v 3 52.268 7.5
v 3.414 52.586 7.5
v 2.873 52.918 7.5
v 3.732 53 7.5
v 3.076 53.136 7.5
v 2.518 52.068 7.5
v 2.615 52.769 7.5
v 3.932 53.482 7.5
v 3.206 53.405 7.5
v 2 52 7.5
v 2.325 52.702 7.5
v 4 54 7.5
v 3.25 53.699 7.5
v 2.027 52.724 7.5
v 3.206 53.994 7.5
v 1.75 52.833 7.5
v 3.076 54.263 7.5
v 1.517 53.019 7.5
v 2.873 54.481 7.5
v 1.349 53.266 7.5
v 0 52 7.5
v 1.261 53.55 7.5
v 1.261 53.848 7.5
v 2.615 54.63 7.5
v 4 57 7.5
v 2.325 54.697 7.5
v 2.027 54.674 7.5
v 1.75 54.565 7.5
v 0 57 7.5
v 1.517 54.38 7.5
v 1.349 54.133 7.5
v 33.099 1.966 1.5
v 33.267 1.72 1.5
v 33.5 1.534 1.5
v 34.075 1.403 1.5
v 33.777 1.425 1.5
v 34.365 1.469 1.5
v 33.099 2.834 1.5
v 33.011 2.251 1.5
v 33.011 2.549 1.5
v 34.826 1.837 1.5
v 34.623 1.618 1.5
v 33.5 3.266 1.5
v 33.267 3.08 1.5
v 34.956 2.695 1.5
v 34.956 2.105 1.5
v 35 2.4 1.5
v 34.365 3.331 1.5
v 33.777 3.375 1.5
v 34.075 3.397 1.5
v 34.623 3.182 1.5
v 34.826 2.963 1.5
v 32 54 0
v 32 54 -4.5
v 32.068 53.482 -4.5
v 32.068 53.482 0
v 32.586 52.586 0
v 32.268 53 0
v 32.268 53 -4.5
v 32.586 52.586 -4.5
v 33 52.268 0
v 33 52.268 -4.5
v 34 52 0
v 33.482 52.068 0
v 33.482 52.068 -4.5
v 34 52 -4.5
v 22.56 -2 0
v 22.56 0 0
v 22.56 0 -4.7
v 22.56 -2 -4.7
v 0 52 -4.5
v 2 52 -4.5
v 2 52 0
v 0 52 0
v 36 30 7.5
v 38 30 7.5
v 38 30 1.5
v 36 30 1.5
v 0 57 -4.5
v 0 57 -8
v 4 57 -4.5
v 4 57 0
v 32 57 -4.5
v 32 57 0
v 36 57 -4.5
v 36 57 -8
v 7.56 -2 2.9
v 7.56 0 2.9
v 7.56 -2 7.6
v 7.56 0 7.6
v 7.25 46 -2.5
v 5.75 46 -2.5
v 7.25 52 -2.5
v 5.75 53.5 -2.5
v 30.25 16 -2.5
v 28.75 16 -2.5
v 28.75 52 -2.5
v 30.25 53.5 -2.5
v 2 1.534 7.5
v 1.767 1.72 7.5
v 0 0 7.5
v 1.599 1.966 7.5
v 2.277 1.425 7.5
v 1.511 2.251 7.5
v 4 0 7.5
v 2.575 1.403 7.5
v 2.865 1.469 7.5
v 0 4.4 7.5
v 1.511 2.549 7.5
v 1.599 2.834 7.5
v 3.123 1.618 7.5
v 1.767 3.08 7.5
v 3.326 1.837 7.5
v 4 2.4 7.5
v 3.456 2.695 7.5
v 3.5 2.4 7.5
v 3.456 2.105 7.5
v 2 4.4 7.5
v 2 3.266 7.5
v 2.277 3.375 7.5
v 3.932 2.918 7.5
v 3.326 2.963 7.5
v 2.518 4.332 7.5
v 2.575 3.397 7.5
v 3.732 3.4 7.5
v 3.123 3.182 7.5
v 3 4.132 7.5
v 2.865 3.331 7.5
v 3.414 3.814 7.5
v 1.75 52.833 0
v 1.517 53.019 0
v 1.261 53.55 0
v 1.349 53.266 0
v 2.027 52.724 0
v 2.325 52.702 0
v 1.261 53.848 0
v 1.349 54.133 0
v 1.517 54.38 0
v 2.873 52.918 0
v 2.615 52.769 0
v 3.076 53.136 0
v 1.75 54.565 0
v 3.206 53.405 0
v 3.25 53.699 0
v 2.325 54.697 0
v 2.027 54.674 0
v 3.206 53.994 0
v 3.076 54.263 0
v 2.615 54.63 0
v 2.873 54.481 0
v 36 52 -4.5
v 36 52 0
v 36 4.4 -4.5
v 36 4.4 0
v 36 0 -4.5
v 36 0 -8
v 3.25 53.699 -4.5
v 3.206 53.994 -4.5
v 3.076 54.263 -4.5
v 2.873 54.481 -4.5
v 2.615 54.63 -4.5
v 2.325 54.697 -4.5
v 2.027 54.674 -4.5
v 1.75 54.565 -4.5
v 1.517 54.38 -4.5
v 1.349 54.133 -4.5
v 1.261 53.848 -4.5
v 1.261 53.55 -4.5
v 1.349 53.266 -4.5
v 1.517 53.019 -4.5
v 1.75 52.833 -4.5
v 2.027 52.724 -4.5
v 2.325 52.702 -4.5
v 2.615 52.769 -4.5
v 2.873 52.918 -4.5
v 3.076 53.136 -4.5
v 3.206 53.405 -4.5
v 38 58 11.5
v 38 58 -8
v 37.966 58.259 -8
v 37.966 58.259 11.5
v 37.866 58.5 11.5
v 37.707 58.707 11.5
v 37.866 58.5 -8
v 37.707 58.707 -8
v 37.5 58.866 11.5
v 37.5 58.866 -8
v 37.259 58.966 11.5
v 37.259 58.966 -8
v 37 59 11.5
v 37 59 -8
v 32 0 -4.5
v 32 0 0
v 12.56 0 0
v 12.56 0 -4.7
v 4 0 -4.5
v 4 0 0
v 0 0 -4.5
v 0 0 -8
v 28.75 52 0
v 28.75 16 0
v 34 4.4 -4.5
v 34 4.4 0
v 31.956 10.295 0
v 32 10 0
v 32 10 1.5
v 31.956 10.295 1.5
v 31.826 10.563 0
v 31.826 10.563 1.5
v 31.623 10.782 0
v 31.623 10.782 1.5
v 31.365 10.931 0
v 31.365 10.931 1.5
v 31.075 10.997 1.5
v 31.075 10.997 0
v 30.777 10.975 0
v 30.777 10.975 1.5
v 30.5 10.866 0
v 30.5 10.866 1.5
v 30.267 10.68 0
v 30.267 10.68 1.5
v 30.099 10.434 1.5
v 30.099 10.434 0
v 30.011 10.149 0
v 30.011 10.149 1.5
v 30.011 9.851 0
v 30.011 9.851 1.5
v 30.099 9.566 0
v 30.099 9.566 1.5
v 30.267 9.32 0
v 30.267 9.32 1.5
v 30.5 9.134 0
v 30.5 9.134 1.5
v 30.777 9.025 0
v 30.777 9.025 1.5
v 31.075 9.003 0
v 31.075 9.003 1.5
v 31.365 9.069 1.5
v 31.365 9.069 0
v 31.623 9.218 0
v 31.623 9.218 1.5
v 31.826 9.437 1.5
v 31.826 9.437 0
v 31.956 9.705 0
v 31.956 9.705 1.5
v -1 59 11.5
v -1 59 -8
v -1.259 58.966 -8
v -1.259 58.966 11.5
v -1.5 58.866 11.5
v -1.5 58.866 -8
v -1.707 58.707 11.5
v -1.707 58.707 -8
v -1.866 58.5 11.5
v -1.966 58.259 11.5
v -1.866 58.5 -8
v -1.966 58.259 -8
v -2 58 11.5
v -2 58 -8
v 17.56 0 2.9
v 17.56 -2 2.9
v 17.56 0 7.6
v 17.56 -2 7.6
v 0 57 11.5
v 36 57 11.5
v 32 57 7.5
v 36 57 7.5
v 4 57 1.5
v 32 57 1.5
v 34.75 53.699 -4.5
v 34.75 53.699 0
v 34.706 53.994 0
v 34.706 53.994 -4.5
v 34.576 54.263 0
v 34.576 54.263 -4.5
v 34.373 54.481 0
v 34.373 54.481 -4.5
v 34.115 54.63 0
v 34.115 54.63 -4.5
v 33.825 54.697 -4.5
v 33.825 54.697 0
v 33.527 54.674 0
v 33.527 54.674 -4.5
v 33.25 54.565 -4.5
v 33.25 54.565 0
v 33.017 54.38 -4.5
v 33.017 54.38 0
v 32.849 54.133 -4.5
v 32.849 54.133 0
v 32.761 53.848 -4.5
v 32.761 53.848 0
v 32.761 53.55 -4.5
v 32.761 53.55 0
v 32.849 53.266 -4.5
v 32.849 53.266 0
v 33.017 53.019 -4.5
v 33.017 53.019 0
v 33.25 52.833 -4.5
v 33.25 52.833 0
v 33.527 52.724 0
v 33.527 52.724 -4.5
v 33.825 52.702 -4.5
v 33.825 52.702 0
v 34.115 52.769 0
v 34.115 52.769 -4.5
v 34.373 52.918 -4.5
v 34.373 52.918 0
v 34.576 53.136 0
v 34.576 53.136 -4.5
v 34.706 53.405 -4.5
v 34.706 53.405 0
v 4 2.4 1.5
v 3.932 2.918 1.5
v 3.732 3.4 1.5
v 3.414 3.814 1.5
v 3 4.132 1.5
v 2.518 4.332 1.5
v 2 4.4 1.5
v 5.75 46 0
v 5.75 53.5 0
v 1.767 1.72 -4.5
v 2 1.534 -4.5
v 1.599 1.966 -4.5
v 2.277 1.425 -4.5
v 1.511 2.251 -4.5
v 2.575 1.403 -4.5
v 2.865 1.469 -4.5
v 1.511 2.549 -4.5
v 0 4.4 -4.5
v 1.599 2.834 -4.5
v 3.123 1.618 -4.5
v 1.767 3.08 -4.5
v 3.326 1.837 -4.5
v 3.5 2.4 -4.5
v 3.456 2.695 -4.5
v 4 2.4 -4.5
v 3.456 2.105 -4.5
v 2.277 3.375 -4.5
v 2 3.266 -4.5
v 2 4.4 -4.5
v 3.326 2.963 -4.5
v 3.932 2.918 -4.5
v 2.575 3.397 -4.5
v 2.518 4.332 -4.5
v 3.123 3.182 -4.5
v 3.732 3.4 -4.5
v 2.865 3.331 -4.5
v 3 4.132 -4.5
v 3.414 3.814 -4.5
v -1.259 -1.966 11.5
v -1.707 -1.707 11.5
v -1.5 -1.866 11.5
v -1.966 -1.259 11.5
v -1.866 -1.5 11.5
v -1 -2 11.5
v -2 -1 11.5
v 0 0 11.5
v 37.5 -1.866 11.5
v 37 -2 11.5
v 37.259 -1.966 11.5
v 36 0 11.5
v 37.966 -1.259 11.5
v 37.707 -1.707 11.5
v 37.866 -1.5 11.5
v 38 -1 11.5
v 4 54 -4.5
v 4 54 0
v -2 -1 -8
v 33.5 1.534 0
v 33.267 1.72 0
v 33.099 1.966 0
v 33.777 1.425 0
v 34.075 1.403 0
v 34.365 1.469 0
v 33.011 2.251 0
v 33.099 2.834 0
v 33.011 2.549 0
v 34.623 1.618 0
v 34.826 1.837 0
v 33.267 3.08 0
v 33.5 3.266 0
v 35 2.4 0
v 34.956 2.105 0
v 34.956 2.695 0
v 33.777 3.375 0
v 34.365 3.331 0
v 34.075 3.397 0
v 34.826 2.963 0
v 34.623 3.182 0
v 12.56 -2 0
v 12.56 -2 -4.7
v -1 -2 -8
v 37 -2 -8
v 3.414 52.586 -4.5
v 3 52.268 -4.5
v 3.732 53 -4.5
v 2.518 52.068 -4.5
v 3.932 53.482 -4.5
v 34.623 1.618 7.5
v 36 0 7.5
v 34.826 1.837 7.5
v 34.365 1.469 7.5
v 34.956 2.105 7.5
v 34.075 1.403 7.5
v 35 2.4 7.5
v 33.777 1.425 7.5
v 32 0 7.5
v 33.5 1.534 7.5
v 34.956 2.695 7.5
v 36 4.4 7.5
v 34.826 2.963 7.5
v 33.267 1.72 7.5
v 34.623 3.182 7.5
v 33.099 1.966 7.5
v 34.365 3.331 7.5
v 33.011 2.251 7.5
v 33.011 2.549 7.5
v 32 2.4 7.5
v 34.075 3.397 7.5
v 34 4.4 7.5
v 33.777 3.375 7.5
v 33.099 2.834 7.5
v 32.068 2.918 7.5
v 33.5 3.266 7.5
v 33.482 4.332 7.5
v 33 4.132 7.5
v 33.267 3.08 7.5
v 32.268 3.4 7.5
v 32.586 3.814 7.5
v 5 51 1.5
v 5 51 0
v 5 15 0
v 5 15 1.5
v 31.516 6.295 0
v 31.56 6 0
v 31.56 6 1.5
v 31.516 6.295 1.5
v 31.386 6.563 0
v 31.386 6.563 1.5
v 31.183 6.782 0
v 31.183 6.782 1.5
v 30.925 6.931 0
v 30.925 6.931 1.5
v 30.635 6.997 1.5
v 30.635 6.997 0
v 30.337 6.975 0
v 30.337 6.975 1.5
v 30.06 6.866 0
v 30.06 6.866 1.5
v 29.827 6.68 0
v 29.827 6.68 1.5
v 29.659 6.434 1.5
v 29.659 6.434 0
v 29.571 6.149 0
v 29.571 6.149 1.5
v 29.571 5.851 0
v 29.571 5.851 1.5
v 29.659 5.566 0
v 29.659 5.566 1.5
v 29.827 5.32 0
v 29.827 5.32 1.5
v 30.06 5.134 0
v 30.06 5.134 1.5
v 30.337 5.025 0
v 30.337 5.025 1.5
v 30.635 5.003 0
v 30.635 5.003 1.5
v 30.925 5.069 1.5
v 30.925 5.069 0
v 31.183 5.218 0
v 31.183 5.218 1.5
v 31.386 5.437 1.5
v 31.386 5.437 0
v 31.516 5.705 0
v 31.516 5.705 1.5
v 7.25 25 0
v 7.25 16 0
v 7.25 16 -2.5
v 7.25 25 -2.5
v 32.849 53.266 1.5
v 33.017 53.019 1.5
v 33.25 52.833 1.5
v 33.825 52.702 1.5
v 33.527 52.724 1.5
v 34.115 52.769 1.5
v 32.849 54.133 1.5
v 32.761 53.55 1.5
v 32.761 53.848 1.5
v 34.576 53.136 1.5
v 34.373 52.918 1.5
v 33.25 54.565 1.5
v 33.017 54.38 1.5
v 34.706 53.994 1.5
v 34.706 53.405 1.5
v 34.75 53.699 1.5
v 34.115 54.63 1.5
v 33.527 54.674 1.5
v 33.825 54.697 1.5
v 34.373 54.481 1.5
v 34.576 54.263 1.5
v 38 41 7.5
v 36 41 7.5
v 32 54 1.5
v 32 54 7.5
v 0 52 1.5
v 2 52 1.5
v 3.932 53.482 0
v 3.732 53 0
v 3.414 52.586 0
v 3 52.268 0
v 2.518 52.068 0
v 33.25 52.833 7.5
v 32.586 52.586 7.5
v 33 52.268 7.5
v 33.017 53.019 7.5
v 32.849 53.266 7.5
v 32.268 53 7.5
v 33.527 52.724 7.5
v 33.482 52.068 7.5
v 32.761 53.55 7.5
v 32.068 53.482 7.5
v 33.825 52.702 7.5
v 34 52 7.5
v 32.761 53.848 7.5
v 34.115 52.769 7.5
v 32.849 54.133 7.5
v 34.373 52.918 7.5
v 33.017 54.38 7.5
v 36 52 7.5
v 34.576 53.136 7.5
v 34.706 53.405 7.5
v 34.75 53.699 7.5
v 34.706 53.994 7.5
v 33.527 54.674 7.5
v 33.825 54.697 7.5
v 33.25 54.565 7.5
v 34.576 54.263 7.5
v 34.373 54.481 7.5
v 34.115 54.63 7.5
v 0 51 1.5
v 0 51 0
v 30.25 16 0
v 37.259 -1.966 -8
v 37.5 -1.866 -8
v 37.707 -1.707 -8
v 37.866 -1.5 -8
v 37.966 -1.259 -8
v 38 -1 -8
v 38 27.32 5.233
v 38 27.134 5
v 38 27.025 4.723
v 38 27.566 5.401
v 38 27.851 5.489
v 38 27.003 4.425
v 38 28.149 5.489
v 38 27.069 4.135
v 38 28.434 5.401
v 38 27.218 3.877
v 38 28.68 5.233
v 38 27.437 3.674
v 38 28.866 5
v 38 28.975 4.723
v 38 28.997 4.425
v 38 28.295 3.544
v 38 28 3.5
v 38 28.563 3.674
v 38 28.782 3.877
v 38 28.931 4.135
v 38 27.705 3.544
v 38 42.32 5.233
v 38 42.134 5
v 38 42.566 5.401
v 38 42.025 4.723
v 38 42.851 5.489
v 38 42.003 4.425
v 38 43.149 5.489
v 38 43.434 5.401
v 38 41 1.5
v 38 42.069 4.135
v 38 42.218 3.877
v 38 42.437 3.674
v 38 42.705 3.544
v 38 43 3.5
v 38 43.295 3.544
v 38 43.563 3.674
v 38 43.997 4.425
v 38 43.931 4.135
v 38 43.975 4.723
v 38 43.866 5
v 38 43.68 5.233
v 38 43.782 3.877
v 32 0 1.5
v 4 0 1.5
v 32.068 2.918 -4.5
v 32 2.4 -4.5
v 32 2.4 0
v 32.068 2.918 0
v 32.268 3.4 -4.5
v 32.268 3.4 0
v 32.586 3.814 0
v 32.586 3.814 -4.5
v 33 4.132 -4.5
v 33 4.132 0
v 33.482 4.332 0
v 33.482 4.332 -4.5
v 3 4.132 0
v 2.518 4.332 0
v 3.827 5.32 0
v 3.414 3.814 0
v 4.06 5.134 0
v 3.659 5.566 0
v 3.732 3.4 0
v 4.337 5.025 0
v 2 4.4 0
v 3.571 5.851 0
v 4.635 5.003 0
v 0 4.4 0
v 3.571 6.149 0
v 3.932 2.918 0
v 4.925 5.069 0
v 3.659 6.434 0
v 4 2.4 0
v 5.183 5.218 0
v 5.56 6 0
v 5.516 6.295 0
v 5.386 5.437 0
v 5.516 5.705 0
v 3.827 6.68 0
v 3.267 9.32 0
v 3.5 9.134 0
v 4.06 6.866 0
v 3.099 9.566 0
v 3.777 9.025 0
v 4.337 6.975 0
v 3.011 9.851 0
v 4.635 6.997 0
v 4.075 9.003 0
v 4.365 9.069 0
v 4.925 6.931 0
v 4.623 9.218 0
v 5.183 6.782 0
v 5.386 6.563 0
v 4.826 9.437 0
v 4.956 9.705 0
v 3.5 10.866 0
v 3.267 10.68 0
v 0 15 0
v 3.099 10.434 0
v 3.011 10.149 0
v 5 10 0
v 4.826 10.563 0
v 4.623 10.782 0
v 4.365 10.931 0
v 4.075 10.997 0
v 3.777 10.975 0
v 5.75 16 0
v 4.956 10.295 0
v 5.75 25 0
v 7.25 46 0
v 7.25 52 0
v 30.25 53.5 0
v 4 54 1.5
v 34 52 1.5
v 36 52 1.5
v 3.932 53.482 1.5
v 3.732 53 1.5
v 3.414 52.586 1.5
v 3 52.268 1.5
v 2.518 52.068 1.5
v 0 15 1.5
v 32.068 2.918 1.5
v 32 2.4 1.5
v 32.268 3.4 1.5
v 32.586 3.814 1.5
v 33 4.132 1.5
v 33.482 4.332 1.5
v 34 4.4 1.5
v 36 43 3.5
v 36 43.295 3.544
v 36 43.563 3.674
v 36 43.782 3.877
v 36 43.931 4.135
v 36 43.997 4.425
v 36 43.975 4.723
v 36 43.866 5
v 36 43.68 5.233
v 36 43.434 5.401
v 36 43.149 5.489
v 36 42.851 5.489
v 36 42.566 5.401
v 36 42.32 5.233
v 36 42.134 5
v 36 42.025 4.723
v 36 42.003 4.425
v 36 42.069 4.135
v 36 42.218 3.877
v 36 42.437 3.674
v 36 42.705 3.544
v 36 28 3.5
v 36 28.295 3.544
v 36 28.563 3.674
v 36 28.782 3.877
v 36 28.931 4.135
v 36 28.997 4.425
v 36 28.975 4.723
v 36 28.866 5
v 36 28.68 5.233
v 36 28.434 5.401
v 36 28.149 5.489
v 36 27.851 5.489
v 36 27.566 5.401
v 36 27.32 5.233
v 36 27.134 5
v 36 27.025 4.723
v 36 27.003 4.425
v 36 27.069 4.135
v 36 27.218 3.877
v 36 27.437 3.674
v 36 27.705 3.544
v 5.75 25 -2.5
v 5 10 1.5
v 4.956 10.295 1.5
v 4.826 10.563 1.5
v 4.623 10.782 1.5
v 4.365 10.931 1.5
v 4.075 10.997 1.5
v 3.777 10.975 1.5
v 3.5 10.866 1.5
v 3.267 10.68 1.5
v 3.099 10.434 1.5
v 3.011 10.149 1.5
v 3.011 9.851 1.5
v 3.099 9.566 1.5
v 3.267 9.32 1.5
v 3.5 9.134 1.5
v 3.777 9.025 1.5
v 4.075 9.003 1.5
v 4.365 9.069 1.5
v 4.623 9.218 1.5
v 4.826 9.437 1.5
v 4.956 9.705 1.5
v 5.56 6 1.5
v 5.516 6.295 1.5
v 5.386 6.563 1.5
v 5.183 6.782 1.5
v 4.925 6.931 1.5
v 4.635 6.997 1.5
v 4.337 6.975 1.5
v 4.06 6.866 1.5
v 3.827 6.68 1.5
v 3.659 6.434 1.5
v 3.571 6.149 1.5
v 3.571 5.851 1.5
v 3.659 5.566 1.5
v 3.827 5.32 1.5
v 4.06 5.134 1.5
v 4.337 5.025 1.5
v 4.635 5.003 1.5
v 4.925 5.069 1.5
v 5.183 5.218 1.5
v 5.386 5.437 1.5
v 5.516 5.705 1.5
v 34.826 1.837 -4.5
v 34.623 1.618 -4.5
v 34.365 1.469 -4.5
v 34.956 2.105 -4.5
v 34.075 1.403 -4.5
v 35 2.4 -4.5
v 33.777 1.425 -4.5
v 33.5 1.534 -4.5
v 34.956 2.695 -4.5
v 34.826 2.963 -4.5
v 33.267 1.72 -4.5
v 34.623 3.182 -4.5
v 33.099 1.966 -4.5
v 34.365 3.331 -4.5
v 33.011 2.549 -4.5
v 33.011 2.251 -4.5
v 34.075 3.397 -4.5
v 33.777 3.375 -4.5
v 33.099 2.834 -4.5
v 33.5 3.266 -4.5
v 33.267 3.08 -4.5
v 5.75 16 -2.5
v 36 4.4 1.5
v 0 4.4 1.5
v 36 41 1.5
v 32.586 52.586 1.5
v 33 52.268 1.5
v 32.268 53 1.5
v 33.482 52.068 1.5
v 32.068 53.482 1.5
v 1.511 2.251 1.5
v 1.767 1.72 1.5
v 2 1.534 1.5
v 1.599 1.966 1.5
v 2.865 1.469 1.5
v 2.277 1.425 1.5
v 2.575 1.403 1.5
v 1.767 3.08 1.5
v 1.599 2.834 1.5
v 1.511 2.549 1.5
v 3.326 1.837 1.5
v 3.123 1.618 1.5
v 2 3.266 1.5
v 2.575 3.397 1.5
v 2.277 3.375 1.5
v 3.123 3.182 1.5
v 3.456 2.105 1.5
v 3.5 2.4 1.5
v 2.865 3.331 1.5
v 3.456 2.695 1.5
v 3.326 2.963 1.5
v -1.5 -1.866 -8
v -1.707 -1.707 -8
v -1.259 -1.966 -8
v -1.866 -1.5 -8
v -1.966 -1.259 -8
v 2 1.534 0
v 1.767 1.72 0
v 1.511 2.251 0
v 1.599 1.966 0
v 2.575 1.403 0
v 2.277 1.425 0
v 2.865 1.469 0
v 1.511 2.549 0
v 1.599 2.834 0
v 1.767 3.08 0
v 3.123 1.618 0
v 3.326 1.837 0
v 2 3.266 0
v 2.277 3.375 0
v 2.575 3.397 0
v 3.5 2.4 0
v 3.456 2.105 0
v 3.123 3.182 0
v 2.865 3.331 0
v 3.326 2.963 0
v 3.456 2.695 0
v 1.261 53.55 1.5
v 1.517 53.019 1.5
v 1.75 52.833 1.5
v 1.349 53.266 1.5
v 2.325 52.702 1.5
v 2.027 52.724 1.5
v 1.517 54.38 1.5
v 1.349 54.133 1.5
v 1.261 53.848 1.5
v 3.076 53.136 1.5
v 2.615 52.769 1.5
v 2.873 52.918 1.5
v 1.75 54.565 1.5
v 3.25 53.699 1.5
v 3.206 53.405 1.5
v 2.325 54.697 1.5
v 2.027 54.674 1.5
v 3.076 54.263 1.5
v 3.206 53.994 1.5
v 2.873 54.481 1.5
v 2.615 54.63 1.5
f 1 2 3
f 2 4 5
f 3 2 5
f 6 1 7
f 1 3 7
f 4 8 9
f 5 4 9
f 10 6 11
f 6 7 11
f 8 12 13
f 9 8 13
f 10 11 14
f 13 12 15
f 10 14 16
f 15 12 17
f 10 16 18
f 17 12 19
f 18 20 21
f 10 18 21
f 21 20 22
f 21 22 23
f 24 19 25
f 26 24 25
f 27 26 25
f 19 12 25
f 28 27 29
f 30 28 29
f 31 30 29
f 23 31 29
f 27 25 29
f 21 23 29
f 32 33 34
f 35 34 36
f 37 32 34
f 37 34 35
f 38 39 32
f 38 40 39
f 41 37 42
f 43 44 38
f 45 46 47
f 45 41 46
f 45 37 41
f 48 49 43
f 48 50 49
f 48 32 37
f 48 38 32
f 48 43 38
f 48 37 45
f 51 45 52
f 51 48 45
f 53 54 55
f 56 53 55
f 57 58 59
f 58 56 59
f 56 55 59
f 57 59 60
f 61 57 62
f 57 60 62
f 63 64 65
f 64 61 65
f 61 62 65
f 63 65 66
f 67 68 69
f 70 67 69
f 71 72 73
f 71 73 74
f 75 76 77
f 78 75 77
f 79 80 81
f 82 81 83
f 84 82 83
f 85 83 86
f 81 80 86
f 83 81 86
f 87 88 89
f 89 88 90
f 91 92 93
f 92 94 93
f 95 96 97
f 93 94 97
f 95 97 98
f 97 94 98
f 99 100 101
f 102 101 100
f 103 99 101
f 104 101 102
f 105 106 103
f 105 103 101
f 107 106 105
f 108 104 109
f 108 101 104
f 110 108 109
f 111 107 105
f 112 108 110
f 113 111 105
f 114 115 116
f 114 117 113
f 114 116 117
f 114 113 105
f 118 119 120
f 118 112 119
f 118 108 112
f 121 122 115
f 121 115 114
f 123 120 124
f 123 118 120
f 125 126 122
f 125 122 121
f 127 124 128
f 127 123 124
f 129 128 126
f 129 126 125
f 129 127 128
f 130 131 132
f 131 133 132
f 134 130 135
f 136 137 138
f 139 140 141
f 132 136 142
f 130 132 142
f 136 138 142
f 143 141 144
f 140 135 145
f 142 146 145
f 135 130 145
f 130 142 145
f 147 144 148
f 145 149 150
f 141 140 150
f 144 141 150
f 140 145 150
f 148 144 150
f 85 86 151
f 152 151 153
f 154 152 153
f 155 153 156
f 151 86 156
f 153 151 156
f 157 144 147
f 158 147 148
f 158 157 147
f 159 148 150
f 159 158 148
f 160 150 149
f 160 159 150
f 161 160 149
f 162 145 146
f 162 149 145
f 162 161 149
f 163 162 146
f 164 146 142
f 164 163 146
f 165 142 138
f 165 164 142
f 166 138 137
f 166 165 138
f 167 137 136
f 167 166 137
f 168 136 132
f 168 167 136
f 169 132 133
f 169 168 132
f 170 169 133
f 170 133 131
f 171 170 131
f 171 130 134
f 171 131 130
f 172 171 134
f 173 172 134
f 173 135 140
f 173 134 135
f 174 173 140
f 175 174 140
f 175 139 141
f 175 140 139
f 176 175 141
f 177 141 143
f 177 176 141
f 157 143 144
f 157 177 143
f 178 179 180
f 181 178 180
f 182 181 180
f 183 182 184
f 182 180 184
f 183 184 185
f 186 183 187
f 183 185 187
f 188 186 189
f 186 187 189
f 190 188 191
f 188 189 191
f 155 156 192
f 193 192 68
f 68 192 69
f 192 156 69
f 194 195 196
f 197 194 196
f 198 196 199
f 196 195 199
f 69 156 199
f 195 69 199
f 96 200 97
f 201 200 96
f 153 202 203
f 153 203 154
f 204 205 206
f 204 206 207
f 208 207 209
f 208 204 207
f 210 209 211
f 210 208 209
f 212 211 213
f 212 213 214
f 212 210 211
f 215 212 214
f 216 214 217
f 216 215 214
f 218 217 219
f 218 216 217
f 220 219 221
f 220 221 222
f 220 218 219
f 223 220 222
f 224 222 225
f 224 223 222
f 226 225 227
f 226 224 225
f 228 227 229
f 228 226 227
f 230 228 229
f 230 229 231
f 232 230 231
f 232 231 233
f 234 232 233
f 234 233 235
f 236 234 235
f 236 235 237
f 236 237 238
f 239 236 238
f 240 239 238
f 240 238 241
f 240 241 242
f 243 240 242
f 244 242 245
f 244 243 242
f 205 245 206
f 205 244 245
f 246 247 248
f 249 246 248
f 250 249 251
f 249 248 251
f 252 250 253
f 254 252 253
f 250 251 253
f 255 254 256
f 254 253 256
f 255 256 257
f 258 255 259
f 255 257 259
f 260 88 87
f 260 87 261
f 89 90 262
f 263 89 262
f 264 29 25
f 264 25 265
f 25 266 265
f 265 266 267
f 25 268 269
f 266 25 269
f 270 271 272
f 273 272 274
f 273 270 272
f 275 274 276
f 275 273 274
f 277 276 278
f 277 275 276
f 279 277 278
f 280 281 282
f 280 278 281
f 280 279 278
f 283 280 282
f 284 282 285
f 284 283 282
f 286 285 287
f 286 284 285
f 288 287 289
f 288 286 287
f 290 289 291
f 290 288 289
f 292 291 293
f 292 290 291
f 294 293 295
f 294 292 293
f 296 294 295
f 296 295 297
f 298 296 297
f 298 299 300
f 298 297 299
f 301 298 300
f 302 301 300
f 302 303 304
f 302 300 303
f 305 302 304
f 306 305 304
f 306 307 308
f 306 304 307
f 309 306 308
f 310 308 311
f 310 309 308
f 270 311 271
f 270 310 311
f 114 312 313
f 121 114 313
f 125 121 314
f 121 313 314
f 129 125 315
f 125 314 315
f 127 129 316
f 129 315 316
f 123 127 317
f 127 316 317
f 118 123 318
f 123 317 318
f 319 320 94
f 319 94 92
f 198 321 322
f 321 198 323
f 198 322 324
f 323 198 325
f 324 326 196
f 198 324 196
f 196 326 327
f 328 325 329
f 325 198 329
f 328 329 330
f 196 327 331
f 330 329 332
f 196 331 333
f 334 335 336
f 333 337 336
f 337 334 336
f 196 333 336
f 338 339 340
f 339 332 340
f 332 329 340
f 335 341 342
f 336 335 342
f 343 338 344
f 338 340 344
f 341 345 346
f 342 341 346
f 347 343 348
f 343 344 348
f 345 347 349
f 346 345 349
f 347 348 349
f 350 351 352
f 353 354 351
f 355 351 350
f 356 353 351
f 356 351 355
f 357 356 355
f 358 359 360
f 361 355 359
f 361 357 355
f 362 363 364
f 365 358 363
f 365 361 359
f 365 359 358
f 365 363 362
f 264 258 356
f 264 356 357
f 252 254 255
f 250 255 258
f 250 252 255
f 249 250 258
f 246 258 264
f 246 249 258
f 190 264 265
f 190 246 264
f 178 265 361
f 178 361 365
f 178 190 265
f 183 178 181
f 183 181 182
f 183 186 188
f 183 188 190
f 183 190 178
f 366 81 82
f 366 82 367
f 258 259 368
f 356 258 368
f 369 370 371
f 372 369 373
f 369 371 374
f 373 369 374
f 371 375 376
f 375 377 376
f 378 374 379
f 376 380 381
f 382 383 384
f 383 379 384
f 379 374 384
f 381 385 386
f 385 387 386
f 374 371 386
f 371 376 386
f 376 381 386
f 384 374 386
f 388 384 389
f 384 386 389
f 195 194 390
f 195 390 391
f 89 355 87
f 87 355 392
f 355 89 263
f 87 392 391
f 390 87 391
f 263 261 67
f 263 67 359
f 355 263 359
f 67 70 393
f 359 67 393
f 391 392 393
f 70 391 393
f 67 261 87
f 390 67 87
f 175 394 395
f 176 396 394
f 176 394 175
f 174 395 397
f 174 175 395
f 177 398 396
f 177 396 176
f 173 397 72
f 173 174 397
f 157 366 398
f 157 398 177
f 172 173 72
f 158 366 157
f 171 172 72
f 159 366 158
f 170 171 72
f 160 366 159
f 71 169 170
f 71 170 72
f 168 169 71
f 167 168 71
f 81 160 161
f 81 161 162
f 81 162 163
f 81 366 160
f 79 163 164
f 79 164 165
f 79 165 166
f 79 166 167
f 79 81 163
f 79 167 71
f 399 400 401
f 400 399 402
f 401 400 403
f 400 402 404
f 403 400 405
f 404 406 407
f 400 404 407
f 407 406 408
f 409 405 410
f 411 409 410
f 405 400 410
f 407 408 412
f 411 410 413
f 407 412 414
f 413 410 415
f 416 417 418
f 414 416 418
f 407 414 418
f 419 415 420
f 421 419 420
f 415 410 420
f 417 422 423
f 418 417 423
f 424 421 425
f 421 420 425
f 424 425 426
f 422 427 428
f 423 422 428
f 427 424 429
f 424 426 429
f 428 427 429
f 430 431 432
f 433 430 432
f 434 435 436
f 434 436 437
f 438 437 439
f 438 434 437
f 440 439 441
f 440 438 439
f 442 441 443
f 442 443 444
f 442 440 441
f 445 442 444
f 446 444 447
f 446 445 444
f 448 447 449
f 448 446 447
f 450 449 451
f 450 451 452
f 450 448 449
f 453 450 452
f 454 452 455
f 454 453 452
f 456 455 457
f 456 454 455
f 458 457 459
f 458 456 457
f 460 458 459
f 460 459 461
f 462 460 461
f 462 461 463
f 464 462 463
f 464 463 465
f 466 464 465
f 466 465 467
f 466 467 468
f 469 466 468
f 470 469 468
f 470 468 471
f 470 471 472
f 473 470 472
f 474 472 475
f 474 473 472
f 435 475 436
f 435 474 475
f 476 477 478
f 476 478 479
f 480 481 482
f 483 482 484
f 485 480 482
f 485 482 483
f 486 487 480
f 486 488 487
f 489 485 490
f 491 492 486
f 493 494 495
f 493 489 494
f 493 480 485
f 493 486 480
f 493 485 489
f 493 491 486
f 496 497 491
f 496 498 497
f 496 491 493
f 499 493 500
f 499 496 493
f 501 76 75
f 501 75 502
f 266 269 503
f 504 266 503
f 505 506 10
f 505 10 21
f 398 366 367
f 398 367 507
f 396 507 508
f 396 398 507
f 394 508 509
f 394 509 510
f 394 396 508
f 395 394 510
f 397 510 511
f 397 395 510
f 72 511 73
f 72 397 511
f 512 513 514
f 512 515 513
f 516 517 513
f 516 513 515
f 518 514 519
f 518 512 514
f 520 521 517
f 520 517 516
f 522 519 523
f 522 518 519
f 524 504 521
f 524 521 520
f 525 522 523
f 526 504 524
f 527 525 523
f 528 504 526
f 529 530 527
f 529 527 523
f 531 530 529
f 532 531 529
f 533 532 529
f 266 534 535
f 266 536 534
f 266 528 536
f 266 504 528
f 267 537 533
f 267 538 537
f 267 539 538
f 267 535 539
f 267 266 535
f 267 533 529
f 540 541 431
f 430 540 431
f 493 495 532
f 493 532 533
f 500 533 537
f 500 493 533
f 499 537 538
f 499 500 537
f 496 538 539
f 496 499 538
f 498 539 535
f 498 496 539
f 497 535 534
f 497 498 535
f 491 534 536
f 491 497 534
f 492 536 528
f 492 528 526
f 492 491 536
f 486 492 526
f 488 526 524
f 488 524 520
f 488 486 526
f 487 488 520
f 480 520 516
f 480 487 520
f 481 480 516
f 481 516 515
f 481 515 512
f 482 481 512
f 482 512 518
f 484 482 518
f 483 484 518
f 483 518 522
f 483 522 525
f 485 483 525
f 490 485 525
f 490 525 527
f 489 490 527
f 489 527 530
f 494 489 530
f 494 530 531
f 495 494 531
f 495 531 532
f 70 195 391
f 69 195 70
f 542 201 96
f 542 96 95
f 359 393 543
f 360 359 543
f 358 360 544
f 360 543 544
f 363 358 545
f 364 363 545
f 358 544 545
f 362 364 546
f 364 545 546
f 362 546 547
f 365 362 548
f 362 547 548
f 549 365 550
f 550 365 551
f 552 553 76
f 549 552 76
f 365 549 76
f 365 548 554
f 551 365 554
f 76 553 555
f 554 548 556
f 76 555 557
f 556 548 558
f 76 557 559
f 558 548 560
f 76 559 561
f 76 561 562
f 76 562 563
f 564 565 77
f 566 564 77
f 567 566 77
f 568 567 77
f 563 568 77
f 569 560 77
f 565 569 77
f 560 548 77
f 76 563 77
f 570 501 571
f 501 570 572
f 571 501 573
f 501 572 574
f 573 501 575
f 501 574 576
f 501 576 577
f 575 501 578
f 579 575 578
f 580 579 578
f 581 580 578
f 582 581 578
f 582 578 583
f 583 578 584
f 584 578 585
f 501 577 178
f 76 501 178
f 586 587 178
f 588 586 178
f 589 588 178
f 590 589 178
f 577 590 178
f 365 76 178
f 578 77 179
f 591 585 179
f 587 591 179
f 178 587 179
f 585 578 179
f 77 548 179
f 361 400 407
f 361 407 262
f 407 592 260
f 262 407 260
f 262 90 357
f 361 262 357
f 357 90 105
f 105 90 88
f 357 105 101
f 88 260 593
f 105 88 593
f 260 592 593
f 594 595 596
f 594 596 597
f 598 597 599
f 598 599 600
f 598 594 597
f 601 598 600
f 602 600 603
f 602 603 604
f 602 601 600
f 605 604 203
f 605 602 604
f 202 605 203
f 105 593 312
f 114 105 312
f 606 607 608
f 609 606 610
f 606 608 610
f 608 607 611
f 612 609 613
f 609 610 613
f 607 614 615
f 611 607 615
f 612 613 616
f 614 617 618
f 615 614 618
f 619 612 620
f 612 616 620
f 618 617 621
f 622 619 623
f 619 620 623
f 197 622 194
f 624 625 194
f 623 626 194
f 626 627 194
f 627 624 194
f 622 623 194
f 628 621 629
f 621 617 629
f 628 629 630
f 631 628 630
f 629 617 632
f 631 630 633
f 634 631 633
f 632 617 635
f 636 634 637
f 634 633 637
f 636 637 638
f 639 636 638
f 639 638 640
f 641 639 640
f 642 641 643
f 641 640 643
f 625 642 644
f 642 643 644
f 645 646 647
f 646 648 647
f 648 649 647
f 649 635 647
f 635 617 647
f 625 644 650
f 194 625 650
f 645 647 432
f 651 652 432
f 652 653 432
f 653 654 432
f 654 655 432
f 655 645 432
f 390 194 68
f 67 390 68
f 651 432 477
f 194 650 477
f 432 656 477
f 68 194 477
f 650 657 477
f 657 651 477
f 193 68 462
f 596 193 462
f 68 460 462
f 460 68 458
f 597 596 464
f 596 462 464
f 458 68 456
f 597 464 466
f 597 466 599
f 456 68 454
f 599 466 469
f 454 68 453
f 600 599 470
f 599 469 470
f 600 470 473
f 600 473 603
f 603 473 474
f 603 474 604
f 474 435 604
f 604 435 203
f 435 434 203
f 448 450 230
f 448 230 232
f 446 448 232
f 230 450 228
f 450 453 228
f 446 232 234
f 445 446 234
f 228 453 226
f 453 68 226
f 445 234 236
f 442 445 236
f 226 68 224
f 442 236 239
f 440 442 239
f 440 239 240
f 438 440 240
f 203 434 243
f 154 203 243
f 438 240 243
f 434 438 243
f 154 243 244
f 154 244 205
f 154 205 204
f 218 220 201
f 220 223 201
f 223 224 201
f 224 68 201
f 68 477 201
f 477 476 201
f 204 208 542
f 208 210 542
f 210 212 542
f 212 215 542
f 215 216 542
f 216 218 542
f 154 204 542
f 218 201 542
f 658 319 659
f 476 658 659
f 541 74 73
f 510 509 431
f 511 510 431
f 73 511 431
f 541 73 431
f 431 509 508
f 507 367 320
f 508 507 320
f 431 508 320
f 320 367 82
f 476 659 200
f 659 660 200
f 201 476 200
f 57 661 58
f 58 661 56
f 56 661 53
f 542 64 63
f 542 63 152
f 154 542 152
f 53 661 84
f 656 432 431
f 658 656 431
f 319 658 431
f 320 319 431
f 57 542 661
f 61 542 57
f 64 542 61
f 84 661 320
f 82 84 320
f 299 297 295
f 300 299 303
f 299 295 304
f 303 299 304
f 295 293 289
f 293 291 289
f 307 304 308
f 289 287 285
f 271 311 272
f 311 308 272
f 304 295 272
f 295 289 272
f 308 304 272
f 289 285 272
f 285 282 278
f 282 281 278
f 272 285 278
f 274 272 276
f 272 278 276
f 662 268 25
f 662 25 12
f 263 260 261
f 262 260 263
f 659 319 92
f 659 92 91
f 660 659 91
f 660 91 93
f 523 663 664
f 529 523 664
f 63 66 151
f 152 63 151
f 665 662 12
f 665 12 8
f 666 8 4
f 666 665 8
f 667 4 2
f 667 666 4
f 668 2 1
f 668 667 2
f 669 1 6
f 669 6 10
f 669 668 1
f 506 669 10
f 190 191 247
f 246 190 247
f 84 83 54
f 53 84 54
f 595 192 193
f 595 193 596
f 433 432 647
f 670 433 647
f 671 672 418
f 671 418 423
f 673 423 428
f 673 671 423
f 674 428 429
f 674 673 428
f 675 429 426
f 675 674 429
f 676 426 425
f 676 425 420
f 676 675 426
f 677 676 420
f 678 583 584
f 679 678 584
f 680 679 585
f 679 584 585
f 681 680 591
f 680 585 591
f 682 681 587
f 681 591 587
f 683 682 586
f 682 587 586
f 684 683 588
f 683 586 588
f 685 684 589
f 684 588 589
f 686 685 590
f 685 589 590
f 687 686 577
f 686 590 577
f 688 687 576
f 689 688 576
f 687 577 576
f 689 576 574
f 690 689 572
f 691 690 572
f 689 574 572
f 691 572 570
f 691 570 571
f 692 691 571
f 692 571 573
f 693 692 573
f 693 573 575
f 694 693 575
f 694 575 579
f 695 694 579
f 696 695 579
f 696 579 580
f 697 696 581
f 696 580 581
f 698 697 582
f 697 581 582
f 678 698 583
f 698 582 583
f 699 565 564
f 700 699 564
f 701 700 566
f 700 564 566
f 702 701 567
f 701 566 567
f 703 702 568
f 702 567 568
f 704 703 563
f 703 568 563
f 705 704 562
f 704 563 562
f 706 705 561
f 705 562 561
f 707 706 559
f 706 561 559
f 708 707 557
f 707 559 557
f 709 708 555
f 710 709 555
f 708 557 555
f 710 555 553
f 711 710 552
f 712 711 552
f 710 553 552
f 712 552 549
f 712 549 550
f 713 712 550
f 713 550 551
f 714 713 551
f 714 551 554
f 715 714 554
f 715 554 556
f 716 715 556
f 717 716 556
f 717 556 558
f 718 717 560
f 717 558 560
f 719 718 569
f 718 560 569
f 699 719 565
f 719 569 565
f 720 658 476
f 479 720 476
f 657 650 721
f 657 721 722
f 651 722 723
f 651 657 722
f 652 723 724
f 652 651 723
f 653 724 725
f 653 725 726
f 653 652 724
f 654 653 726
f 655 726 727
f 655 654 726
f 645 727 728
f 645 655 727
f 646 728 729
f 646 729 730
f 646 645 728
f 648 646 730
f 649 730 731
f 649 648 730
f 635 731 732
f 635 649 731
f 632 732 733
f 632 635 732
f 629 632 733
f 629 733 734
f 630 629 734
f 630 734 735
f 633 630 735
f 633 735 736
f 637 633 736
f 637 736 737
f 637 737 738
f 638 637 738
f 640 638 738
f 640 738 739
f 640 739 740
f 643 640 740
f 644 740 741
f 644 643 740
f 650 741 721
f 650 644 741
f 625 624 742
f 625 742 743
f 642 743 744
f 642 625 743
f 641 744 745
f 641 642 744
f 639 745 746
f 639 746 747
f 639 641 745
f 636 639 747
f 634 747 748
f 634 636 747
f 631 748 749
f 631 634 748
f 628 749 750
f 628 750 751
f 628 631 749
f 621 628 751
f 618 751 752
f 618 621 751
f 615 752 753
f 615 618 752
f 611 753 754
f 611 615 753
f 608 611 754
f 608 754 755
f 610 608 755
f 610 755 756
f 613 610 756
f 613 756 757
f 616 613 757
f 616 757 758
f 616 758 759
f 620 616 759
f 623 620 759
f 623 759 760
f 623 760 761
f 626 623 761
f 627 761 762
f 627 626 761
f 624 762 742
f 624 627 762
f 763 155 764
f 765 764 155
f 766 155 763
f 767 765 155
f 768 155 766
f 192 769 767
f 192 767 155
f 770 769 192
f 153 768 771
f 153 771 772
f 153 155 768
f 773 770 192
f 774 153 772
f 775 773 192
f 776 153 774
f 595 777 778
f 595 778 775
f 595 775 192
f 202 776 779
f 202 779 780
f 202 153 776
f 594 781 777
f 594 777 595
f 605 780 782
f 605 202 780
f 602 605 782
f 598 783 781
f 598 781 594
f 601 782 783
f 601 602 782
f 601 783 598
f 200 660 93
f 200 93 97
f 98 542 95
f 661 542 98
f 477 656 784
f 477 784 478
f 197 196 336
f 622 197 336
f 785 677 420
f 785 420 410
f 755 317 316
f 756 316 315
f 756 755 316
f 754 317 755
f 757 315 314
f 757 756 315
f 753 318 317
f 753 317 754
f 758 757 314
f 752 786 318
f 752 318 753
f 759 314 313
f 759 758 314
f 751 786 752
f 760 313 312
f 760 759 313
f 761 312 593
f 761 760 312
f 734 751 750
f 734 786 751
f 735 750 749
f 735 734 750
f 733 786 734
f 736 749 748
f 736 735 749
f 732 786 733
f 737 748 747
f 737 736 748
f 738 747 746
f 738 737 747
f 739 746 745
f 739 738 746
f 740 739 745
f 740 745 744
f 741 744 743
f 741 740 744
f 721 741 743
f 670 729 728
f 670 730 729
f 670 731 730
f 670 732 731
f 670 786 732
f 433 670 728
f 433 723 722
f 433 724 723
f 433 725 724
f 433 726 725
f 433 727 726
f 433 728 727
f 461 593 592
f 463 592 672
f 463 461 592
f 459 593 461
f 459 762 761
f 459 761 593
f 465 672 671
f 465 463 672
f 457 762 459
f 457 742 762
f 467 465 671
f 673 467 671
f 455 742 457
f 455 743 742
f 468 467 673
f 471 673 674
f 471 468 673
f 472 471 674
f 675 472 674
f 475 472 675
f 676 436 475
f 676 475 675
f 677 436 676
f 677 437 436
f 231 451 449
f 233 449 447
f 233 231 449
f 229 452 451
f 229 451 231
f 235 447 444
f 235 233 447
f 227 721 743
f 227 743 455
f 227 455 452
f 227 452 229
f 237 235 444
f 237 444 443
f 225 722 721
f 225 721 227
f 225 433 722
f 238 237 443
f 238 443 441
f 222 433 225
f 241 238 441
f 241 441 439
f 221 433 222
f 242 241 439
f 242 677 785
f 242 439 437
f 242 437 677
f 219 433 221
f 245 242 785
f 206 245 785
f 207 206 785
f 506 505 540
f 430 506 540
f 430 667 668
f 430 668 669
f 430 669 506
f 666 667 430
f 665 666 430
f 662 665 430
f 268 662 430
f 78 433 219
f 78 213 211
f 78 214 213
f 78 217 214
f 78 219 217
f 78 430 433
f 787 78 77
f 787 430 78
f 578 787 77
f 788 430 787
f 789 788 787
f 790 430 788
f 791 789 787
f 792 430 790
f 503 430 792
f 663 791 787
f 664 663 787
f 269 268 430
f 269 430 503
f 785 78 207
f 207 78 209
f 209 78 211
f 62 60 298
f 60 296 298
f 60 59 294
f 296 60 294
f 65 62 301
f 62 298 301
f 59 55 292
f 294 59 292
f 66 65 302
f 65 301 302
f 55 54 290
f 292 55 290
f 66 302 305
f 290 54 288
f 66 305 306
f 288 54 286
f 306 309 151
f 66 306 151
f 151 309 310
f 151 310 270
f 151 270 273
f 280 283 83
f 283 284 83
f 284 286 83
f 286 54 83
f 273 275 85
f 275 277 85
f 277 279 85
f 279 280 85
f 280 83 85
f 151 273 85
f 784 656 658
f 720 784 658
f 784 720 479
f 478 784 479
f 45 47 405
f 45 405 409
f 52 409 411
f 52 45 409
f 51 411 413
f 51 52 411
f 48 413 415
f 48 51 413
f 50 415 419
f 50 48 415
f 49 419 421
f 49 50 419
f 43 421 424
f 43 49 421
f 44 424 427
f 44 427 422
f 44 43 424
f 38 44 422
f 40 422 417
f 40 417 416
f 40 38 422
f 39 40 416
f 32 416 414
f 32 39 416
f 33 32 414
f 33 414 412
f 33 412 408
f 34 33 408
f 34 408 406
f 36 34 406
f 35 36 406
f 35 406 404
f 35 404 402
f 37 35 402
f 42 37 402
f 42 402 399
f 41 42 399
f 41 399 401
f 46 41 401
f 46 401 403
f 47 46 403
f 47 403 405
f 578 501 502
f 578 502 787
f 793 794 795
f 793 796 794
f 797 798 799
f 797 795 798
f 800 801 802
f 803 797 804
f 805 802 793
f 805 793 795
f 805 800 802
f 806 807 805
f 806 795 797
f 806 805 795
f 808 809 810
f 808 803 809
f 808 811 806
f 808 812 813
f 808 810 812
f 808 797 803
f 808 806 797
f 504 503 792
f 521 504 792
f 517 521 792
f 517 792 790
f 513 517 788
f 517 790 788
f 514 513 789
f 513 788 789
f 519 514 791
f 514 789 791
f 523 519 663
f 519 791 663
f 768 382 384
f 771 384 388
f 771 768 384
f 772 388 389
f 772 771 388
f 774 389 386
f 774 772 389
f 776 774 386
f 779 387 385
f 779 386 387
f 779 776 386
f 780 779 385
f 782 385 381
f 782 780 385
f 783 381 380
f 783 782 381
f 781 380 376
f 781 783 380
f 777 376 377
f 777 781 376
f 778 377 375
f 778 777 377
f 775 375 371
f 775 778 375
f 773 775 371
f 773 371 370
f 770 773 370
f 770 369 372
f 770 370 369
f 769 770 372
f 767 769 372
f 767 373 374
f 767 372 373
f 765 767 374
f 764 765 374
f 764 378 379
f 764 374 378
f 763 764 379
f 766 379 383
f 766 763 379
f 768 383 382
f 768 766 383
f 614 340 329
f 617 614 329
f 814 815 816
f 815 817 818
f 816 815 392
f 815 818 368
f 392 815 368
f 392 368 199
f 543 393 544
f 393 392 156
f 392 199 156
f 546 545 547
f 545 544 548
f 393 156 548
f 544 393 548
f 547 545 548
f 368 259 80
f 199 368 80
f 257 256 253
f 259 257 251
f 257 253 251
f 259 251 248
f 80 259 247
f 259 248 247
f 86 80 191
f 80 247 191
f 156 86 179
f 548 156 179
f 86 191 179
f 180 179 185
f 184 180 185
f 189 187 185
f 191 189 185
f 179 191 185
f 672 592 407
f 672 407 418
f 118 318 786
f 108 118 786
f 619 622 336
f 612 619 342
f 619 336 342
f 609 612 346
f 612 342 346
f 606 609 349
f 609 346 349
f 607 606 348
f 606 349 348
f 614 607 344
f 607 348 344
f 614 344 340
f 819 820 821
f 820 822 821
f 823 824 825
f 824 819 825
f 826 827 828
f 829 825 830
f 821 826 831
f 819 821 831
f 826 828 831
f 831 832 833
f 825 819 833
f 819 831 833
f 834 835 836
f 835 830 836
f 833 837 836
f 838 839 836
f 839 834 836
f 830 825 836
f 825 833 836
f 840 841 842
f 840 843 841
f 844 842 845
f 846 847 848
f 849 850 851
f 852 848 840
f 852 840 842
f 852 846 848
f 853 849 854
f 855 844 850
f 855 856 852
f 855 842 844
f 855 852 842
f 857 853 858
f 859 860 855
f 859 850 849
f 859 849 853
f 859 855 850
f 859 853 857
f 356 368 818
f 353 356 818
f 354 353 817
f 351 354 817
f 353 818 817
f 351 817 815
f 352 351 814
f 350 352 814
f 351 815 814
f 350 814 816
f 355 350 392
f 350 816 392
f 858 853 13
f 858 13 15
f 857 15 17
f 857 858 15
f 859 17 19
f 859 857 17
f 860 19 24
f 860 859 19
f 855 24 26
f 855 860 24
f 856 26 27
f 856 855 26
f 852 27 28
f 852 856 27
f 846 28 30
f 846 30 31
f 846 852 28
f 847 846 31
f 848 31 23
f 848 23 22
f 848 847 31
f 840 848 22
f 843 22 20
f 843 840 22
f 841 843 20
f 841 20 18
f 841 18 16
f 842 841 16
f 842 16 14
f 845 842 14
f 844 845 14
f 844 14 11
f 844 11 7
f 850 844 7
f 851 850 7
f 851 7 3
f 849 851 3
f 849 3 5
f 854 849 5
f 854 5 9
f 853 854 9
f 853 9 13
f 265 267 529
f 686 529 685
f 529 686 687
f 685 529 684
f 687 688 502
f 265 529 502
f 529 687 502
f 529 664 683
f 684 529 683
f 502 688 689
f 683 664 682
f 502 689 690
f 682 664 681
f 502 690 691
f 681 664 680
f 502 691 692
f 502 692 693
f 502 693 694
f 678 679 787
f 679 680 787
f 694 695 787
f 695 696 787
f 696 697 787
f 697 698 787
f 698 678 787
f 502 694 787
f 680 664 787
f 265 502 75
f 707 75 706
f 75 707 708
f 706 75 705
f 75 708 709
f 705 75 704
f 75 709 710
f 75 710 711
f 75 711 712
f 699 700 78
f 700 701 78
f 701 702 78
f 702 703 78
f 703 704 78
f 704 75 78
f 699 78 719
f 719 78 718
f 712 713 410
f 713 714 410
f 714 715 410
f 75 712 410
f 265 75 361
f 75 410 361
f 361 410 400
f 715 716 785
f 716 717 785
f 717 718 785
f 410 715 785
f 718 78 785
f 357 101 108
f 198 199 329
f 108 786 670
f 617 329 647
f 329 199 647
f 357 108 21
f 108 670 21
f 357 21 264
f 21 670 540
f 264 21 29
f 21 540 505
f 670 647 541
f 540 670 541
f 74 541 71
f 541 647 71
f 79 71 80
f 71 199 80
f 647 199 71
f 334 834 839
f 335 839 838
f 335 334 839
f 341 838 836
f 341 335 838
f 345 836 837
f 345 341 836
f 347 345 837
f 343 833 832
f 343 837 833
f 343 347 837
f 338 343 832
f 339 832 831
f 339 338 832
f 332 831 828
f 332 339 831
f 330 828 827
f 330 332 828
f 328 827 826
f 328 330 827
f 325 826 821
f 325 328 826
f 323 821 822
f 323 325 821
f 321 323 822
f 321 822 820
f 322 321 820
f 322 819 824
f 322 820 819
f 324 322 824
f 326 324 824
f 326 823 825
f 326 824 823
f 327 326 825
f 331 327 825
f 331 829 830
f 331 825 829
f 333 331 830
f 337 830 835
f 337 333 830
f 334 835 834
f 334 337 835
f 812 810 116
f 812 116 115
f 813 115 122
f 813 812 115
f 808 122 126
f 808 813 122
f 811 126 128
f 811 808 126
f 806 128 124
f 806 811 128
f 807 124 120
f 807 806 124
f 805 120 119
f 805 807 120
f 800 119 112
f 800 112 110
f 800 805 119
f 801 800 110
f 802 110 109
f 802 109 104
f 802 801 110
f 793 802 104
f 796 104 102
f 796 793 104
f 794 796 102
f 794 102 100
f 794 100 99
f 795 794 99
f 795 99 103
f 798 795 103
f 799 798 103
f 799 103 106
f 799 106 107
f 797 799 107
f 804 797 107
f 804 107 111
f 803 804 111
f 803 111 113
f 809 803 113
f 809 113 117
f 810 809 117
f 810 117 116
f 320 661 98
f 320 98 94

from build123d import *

# Parameters (mm, degrees)
SKETCH_2_R             = 1
EXTRUDE_2250_DEPTH     = 7.5
EXTRUDE_2250_2_DEPTH   = 7.5
EXTRUDE_2250_3_DEPTH   = 7.5
EXTRUDE_2250_4_DEPTH   = 7.5
EXTRUDE_START          = -4.5
SKETCH_2_5_R           = 1
EXTRUDE_2650_DEPTH     = 4.5
EXTRUDE_2650_2_DEPTH   = 4.5
EXTRUDE_2650_3_DEPTH   = 4.5
EXTRUDE_2650_4_DEPTH   = 4.5
EXTRUDE_2769_DEPTH     = 11.5
SKETCH_15_W            = 10
SKETCH_15_H            = 4.7
CUT_EXTRUDE_2936_DEPTH = 2
ESP32_START            = -8
ESP32_DEPTH            = 8
ESP32_3_W              = 10
ESP32_3_H              = 4.7
ESP32_2_DEPTH          = 2
SKETCH_1_29_R          = 1
SKETCH_1_29_W          = 1.5
SKETCH_1_29_H          = 9
EXTRUDE_3195_DEPTH     = 1.5
EXTRUDE_3_DEPTH        = 2.5
SKETCH_1_30_W          = 1.5
SKETCH_1_30_H          = 9
EXTRUDE_3_2_DEPTH      = 2.5
SKETCH_1_31_W          = 1.5
SKETCH_1_31_H          = 9
EXTRUDE_4_DEPTH        = 1.5
SKETCH_18_R            = 1
SKETCH_18_W            = 6
SKETCH_18_H            = 11
CUT_EXTRUDE_4645_DEPTH = 2


with BuildPart() as part:
    # 草图2 → Extrude 2250 (new body)
    with BuildSketch(Plane.XY):
        with BuildLine():
            Line((0, 0), (4, 0))
            Line((4, 0), (4, 2.4))
            ThreePointArc((4, 2.4), (3.414213562, 3.814213562), (2, 4.4))
            Line((2, 4.4), (0, 4.4))
            Line((0, 4.4), (0, 0))
        make_face()
        with Locations((2.5, 2.4)):
            Circle(SKETCH_2_R, mode=Mode.SUBTRACT)
    extrude(amount=EXTRUDE_2250_DEPTH)



with BuildPart() as body_2:
    # 草图2 → Extrude 2250 2 (new body)
    with BuildSketch(Plane.XY):
        with BuildLine():
            Line((36, 0), (32, 0))
            Line((32, 0), (32, 2.4))
            ThreePointArc((32, 2.4), (32.585786438, 3.814213562), (34, 4.4))
            Line((34, 4.4), (36, 4.4))
            Line((36, 4.4), (36, 0))
        make_face()
        with Locations((34, 2.4)):
            Circle(SKETCH_2_R, mode=Mode.SUBTRACT)
    extrude(amount=EXTRUDE_2250_2_DEPTH)


with BuildPart() as body_3:
    # 草图2 → Extrude 2250 3 (new body)
    with BuildSketch(Plane.XY):
        with BuildLine():
            Line((36, 57), (32, 57))
            Line((32, 57), (32, 54))
            ThreePointArc((32, 54), (32.585786438, 52.585786438), (34, 52))
            Line((34, 52), (36, 52))
            Line((36, 52), (36, 57))
        make_face()
        with Locations((33.75, 53.699390835)):
            Circle(SKETCH_2_R, mode=Mode.SUBTRACT)
    extrude(amount=EXTRUDE_2250_3_DEPTH)


with BuildPart() as body_4:
    # 草图2 → Extrude 2250 4 (new body)
    with BuildSketch(Plane.XY):
        with BuildLine():
            Line((0, 57), (4, 57))
            Line((4, 57), (4, 54))
            ThreePointArc((4, 54), (3.414213562, 52.585786438), (2, 52))
            Line((2, 52), (0, 52))
            Line((0, 52), (0, 57))
        make_face()
        with Locations((2.25, 53.699390835)):
            Circle(SKETCH_2_R, mode=Mode.SUBTRACT)
    extrude(amount=EXTRUDE_2250_4_DEPTH)


with BuildPart() as body_5:
    # 草图2<5> → Extrude 2650 (new body)
    with BuildSketch(Plane.XY.offset(EXTRUDE_START)):
        with BuildLine():
            Line((0, 0), (4, 0))
            Line((4, 0), (4, 2.4))
            ThreePointArc((4, 2.4), (3.414213562, 3.814213562), (2, 4.4))
            Line((2, 4.4), (0, 4.4))
            Line((0, 4.4), (0, 0))
        make_face()
        with Locations((2.5, 2.4)):
            Circle(SKETCH_2_5_R, mode=Mode.SUBTRACT)
    extrude(amount=EXTRUDE_2650_DEPTH)


with BuildPart() as body_6:
    # 草图2<5> → Extrude 2650 2 (new body)
    with BuildSketch(Plane.XY.offset(EXTRUDE_START)):
        with BuildLine():
            Line((36, 0), (32, 0))
            Line((32, 0), (32, 2.4))
            ThreePointArc((32, 2.4), (32.585786438, 3.814213562), (34, 4.4))
            Line((34, 4.4), (36, 4.4))
            Line((36, 4.4), (36, 0))
        make_face()
        with Locations((34, 2.4)):
            Circle(SKETCH_2_5_R, mode=Mode.SUBTRACT)
    extrude(amount=EXTRUDE_2650_2_DEPTH)


with BuildPart() as body_7:
    # 草图2<5> → Extrude 2650 3 (new body)
    with BuildSketch(Plane.XY.offset(EXTRUDE_START)):
        with BuildLine():
            Line((36, 57), (32, 57))
            Line((32, 57), (32, 54))
            ThreePointArc((32, 54), (32.585786438, 52.585786438), (34, 52))
            Line((34, 52), (36, 52))
            Line((36, 52), (36, 57))
        make_face()
        with Locations((33.75, 53.699390835)):
            Circle(SKETCH_2_5_R, mode=Mode.SUBTRACT)
    extrude(amount=EXTRUDE_2650_3_DEPTH)


with BuildPart() as body_8:
    # 草图2<5> → Extrude 2650 4 (new body)
    with BuildSketch(Plane.XY.offset(EXTRUDE_START)):
        with BuildLine():
            Line((0, 57), (4, 57))
            Line((4, 57), (4, 54))
            ThreePointArc((4, 54), (3.414213562, 52.585786438), (2, 52))
            Line((2, 52), (0, 52))
            Line((0, 52), (0, 57))
        make_face()
        with Locations((2.25, 53.699390835)):
            Circle(SKETCH_2_5_R, mode=Mode.SUBTRACT)
    extrude(amount=EXTRUDE_2650_4_DEPTH)


with BuildPart() as part_1:
    add(part.part)

    add(body_2.part)  # Extrude 2769 merges body 2

    add(body_3.part)  # Extrude 2769 merges body 3

    add(body_4.part)  # Extrude 2769 merges body 4

    add(body_5.part)  # Extrude 2769 merges body 5

    add(body_6.part)  # Extrude 2769 merges body 6

    add(body_7.part)  # Extrude 2769 merges body 7

    add(body_8.part)  # Extrude 2769 merges body 8
    # 草图1 → Extrude 2769 (add)
    with BuildSketch(Plane.XY):
        with BuildLine():
            ThreePointArc((-2, -1), (-1.707106781, -1.707106781), (-1, -2))
            Line((-1, -2), (37, -2))
            ThreePointArc((37, -2), (37.707106781, -1.707106781), (38, -1))
            Line((38, -1), (38, 58))
            ThreePointArc((38, 58), (37.707106781, 58.707106781), (37, 59))
            Line((37, 59), (-1, 59))
            ThreePointArc((-1, 59), (-1.707106781, 58.707106781), (-2, 58))
            Line((-2, 58), (-2, -1))
        make_face()
        Polygon((36, 0), (0, 0), (0, 15), (0, 51), (0, 57), (36, 57), align=None, mode=Mode.SUBTRACT)
    extrude(amount=EXTRUDE_2769_DEPTH)

    # 草图15 → Cut-Extrude 2936 (cut)
    with BuildSketch(Plane.XZ):
        with Locations((12.56, 5.25)):
            Rectangle(SKETCH_15_W, SKETCH_15_H)
    extrude(amount=CUT_EXTRUDE_2936_DEPTH, mode=Mode.SUBTRACT)

    # 草图1 regions → ESP32 (add)
    with BuildSketch(Plane.XY.offset(ESP32_START)):
        with BuildLine():
            ThreePointArc((-2, -1), (-1.707106781, -1.707106781), (-1, -2))
            Line((-1, -2), (37, -2))
            ThreePointArc((37, -2), (37.707106781, -1.707106781), (38, -1))
            Line((38, -1), (38, 58))
            ThreePointArc((38, 58), (37.707106781, 58.707106781), (37, 59))
            Line((37, 59), (-1, 59))
            ThreePointArc((-1, 59), (-1.707106781, 58.707106781), (-2, 58))
            Line((-2, 58), (-2, -1))
        make_face()
        Polygon((36, 0), (0, 0), (0, 15), (0, 51), (0, 57), (36, 57), align=None, mode=Mode.SUBTRACT)
    extrude(amount=ESP32_DEPTH)

    # ESP32 3 → ESP32 2 (cut)
    with BuildSketch(Plane(origin=(0, 0, 0), x_dir=(1, 0, 0), z_dir=(0, 1, 0))):
        with Locations((17.56, 2.35)):
            Rectangle(ESP32_3_W, ESP32_3_H)
    extrude(amount=-ESP32_2_DEPTH, mode=Mode.SUBTRACT)

    # 草图1<29> → Extrude 3195 (add)
    with BuildSketch(Plane.XY):
        Polygon((0, 15), (0, 0), (36, 0), (36, 57), (0, 57), (0, 51), (5, 51), (5, 15), align=None)
        with Locations((4.56, 6)):
            Circle(SKETCH_1_29_R, mode=Mode.SUBTRACT)
        with Locations((4, 10)):
            Circle(SKETCH_1_29_R, mode=Mode.SUBTRACT)
        with Locations((6.5, 20.5)):
            Rectangle(SKETCH_1_29_W, SKETCH_1_29_H, mode=Mode.SUBTRACT)
        with Locations((30.56, 6)):
            Circle(SKETCH_1_29_R, mode=Mode.SUBTRACT)
        with Locations((31, 10)):
            Circle(SKETCH_1_29_R, mode=Mode.SUBTRACT)
        Polygon((30.25, 16), (28.75, 16), (28.75, 52), (7.25, 52), (7.25, 46), (5.75, 46), (5.75, 53.5), (30.25, 53.5), (30.25, 52), align=None, mode=Mode.SUBTRACT)
    extrude(amount=EXTRUDE_3195_DEPTH)



with BuildPart() as body_2_2:
    # 草图1<30> → 凸台-拉伸3 (new body)
    with BuildSketch(Plane.XY):
        Polygon((5.75, 46), (7.25, 46), (7.25, 52), (28.75, 52), (28.75, 16), (30.25, 16), (30.25, 52), (30.25, 53.5), (5.75, 53.5), align=None)
    extrude(amount=-EXTRUDE_3_DEPTH)


with BuildPart() as body_3_2:
    # 草图1<30> → Extrude 3 2 (new body)
    with BuildSketch(Plane.XY):
        with Locations((6.5, 20.5)):
            Rectangle(SKETCH_1_30_W, SKETCH_1_30_H)
    extrude(amount=-EXTRUDE_3_2_DEPTH)


with BuildPart() as part_2:
    add(part_1.part)

    add(body_2_2.part)  # 凸台-拉伸4 merges body 2 2

    add(body_3_2.part)  # 凸台-拉伸4 merges body 3 2
    # 草图1<31> → 凸台-拉伸4 (add)
    with BuildSketch(Plane.XY):
        Polygon((28.75, 16), (30.25, 16), (30.25, 52), (30.25, 53.5), (5.75, 53.5), (5.75, 46), (7.25, 46), (7.25, 52), (28.75, 52), align=None)
        with Locations((6.5, 20.5)):
            Rectangle(SKETCH_1_31_W, SKETCH_1_31_H)
    extrude(amount=EXTRUDE_4_DEPTH)

    # 草图18 → Cut-Extrude 4645 (cut)
    with BuildSketch(Plane(origin=(38, 0, 0), x_dir=(0, 0, -1), z_dir=(1, 0, 0))):
        with Locations((-4.5, 43)):
            Circle(SKETCH_18_R)
        with Locations((-4.5, 28)):
            Circle(SKETCH_18_R)
        with Locations((-4.5, 35.5)):
            Rectangle(SKETCH_18_W, SKETCH_18_H)
    extrude(amount=-CUT_EXTRUDE_4645_DEPTH, mode=Mode.SUBTRACT)


solid = part_2.part
